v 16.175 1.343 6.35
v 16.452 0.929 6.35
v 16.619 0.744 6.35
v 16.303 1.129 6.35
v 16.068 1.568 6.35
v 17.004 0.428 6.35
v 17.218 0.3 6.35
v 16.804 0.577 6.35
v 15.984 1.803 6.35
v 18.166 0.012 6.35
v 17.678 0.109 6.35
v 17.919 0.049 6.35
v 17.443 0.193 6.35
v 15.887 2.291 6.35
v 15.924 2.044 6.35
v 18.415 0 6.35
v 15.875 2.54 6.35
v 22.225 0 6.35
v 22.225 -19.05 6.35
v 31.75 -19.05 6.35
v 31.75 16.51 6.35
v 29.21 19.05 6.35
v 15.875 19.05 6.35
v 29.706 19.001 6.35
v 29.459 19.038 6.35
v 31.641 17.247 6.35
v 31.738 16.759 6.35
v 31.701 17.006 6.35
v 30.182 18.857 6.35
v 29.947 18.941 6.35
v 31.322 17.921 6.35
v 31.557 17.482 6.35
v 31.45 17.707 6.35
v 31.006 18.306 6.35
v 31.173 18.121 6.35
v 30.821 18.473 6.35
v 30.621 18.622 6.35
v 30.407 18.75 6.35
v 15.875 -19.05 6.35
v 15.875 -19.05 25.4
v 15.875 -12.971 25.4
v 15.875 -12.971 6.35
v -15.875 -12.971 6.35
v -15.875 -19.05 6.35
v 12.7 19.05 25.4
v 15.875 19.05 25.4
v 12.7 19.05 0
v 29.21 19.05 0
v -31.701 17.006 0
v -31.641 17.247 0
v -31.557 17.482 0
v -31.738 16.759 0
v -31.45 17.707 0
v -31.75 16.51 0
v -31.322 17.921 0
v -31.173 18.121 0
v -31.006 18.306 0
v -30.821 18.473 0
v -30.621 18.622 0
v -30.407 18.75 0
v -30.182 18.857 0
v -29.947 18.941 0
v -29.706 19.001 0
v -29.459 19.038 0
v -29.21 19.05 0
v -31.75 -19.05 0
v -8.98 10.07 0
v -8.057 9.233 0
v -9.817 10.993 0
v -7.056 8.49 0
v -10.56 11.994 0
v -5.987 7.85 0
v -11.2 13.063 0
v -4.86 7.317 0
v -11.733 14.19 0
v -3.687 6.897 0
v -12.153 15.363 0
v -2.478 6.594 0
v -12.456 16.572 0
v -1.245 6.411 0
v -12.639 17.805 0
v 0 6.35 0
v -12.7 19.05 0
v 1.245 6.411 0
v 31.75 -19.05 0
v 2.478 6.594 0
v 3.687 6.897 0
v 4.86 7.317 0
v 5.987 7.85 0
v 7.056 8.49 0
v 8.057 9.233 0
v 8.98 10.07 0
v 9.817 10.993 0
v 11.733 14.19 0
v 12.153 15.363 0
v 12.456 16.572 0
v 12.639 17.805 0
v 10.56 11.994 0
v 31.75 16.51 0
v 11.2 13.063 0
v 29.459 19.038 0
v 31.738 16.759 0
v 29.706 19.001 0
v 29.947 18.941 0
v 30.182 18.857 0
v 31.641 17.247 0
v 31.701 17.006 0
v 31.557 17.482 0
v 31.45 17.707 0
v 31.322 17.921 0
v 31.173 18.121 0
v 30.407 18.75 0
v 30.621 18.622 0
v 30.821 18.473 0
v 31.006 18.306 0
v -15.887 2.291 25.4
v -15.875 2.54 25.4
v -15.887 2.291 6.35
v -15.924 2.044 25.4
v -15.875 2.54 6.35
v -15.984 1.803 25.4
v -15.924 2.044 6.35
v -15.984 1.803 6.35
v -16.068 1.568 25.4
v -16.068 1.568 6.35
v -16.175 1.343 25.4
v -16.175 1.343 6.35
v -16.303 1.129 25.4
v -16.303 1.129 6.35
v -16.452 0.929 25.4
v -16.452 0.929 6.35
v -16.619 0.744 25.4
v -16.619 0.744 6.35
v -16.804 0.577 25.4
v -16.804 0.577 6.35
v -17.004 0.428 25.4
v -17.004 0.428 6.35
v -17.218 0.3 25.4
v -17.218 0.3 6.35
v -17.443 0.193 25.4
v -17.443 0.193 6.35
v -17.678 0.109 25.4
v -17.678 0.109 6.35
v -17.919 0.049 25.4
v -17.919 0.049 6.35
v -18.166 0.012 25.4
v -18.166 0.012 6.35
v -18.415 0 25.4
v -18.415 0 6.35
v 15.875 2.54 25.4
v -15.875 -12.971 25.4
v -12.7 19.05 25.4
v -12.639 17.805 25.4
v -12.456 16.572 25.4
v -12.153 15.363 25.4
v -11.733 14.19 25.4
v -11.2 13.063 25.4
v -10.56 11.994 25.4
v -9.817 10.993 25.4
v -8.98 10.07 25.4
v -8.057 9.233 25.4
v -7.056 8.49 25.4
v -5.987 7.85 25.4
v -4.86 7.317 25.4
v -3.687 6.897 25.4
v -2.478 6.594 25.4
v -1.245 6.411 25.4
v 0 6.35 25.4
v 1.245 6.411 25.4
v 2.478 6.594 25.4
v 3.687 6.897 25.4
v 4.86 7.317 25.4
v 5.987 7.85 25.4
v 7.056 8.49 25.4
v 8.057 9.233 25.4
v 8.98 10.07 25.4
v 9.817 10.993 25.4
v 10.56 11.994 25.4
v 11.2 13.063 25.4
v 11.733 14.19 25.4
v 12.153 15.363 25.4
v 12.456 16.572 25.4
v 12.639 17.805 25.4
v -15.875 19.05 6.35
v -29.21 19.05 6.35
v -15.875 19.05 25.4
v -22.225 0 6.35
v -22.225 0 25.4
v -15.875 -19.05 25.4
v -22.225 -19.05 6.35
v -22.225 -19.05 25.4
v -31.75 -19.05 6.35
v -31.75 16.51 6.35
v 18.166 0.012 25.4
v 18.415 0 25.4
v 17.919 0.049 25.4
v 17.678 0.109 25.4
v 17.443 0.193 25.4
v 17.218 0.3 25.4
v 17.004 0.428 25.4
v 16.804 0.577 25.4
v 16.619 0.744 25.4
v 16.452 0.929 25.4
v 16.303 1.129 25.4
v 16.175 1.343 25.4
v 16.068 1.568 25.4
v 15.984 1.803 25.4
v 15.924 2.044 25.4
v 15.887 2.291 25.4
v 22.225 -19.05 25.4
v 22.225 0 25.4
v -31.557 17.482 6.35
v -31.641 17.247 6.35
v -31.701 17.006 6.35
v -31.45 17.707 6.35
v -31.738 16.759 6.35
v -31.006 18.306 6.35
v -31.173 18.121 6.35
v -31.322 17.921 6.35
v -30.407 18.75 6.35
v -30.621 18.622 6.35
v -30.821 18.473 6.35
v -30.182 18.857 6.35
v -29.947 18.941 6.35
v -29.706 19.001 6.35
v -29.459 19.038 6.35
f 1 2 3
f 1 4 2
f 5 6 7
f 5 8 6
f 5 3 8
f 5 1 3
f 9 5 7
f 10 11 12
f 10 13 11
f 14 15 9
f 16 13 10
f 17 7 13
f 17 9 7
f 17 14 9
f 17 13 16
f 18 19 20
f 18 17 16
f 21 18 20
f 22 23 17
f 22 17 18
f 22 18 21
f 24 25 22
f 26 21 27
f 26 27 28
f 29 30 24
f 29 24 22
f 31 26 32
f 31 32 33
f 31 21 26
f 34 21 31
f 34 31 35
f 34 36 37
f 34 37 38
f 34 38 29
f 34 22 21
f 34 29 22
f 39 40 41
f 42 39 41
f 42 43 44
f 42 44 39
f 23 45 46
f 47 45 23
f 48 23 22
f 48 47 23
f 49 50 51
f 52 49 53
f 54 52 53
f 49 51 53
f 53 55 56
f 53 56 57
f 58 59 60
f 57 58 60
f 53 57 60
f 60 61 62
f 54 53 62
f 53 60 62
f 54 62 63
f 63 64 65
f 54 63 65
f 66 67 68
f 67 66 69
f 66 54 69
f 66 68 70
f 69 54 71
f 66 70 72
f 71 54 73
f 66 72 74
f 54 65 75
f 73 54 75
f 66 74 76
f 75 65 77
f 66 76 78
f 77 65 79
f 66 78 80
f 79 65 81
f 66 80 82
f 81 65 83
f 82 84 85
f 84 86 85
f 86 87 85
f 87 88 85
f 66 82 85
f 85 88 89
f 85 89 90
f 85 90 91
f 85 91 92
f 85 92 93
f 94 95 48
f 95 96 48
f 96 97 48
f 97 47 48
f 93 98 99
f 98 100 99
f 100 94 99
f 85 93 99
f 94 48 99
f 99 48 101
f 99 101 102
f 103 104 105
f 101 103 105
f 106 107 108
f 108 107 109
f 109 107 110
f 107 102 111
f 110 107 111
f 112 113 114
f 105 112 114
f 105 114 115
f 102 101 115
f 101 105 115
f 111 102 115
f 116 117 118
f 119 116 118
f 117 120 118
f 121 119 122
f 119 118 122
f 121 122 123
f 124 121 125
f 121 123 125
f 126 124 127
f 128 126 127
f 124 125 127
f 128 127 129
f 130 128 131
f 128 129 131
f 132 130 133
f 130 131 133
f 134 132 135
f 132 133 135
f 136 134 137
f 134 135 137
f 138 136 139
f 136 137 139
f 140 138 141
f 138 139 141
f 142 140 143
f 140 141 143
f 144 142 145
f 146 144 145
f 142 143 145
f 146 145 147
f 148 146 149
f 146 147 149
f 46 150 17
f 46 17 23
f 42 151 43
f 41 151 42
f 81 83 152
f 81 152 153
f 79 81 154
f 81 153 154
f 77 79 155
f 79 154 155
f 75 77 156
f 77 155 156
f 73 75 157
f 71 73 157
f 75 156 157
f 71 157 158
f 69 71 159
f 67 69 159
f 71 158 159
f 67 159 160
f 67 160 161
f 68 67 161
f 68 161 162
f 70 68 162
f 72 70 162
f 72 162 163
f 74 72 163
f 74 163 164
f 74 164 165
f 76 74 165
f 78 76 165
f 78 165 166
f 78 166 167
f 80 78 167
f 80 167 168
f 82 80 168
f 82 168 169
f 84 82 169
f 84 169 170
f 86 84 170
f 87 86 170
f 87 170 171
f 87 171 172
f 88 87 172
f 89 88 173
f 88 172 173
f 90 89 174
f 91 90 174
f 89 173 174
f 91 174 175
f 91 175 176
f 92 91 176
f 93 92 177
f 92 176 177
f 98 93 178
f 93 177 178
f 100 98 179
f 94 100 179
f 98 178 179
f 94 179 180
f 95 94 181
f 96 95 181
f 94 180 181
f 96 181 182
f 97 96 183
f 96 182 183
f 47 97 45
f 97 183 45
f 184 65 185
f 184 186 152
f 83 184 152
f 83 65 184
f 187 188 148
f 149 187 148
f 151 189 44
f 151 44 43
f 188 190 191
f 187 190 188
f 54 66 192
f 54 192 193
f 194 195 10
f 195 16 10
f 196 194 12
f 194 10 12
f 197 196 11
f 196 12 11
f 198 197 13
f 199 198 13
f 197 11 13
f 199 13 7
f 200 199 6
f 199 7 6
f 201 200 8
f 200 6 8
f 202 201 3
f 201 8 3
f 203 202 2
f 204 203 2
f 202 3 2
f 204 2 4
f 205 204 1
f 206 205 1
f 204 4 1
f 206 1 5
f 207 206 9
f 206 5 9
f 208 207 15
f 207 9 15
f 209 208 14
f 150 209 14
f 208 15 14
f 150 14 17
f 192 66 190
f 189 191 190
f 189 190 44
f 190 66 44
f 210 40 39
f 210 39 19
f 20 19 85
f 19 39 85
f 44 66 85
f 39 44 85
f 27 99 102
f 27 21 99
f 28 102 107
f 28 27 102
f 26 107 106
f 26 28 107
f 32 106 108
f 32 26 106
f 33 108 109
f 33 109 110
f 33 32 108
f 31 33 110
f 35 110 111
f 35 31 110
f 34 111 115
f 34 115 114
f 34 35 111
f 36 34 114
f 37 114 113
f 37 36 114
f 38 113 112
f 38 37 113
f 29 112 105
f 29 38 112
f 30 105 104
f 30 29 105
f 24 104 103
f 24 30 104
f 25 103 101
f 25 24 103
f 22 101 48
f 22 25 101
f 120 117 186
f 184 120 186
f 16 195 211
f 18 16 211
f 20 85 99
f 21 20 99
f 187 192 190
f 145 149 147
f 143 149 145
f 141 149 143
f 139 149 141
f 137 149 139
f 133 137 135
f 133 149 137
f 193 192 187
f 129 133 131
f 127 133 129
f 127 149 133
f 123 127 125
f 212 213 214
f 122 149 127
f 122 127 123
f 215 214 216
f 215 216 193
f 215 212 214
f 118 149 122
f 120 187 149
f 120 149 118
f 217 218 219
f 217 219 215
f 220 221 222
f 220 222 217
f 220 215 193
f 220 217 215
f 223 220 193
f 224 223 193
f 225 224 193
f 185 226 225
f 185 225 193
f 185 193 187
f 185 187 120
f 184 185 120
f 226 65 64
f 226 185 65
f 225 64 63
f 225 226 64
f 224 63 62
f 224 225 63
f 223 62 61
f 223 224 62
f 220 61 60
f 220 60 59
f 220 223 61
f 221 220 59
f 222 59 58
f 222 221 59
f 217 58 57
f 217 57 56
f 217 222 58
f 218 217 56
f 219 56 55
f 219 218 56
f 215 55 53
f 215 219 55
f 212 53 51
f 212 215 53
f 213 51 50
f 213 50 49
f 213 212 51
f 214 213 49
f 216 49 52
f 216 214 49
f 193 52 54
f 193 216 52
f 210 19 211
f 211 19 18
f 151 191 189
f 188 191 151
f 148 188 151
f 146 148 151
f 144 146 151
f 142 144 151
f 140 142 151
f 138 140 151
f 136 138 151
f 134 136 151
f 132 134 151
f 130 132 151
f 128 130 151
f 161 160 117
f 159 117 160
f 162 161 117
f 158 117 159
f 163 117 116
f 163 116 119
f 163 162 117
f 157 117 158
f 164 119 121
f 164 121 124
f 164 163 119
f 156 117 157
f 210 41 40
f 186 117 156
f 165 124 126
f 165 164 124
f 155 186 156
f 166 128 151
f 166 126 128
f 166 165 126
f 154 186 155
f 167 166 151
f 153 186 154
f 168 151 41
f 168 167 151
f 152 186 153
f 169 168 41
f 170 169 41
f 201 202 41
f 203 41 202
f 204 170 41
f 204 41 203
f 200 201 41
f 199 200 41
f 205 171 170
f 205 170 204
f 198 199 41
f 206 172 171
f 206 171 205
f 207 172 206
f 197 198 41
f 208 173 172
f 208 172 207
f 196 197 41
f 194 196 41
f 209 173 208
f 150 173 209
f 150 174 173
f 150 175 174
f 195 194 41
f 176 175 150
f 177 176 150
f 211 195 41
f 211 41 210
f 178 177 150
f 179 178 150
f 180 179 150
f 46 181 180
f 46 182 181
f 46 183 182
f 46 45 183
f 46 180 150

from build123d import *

# Parameters (mm, degrees)
F0_W      = 63.5
F0_H      = 38.1
F1_DEPTH  = 6.35
F2_W      = 44.45
F2_H      = 38.1
F3_DEPTH  = 19.05
F4_W      = 31.75
F4_H      = 12.158688
F5_DEPTH  = 19.05
F7_DEPTH  = 25.401
F9_W      = 6.35
F9_H      = 19.05
F10_DEPTH = 19.05
F11_W     = 6.35
F11_H     = 19.05
F12_DEPTH = 19.05
F13_R     = 2.54
F14_R     = 2.54
F15_R     = 2.54
F16_R     = 2.54


with BuildPart() as f1:
    # F0 (on Top) → F1 (new body)
    with BuildSketch(Plane.XY):
        Rectangle(F0_W, F0_H)
    extrude(amount=F1_DEPTH)

    # F2 (on face) → F3 (join)
    with BuildSketch(Plane.XY.offset(6.35)):
        Rectangle(F2_W, F2_H)
    extrude(amount=F3_DEPTH)

    # F4 (on face) → F5 (cut)
    with BuildSketch(Plane.XY.offset(25.4)):
        with Locations((0, -19.05)):
            Rectangle(F4_W, F4_H)
    extrude(amount=-F5_DEPTH, mode=Mode.SUBTRACT)

    # F6 (on face) → F7 (cut, through all)
    with BuildSketch(Plane.XY.offset(25.4)):
        with BuildLine():
            Line((-12.7, 19.05), (12.7, 19.05))
            ThreePointArc((12.7, 19.05), (0, 31.75), (-12.7, 19.05))
        make_face()
        with BuildLine():
            ThreePointArc((-12.7, 19.05), (0, 6.35), (12.7, 19.05))
            Line((12.7, 19.05), (-12.7, 19.05))
        make_face()
    extrude(amount=-F7_DEPTH, mode=Mode.SUBTRACT)

    # F9 (on face) → F10 (cut)
    with BuildSketch(Plane.XY.offset(25.4)):
        with Locations((-19.05, 9.525)):
            Rectangle(F9_W, F9_H)
    extrude(amount=-F10_DEPTH, mode=Mode.SUBTRACT)

    # F11 (on face) → F12 (cut)
    with BuildSketch(Plane.XY.offset(25.4)):
        with Locations((19.05, 9.525)):
            Rectangle(F11_W, F11_H)
    extrude(amount=-F12_DEPTH, mode=Mode.SUBTRACT)

    # F13
    f13_edges = [f1.edges().sort_by_distance(p)[0] for p in [
        (15.875, 0, 15.875),
    ]]
    fillet(f13_edges, radius=F13_R)

    # F14
    f14_edges = [f1.edges().sort_by_distance(p)[0] for p in [
        (-15.875, 0, 15.875),
    ]]
    fillet(f14_edges, radius=F14_R)

    # F15
    f15_edges = [f1.edges().sort_by_distance(p)[0] for p in [
        (-31.75, 19.05, 3.175),
    ]]
    fillet(f15_edges, radius=F15_R)

    # F16
    f16_edges = [f1.edges().sort_by_distance(p)[0] for p in [
        (31.75, 19.05, 3.175),
    ]]
    fillet(f16_edges, radius=F16_R)


solid = f1.part
